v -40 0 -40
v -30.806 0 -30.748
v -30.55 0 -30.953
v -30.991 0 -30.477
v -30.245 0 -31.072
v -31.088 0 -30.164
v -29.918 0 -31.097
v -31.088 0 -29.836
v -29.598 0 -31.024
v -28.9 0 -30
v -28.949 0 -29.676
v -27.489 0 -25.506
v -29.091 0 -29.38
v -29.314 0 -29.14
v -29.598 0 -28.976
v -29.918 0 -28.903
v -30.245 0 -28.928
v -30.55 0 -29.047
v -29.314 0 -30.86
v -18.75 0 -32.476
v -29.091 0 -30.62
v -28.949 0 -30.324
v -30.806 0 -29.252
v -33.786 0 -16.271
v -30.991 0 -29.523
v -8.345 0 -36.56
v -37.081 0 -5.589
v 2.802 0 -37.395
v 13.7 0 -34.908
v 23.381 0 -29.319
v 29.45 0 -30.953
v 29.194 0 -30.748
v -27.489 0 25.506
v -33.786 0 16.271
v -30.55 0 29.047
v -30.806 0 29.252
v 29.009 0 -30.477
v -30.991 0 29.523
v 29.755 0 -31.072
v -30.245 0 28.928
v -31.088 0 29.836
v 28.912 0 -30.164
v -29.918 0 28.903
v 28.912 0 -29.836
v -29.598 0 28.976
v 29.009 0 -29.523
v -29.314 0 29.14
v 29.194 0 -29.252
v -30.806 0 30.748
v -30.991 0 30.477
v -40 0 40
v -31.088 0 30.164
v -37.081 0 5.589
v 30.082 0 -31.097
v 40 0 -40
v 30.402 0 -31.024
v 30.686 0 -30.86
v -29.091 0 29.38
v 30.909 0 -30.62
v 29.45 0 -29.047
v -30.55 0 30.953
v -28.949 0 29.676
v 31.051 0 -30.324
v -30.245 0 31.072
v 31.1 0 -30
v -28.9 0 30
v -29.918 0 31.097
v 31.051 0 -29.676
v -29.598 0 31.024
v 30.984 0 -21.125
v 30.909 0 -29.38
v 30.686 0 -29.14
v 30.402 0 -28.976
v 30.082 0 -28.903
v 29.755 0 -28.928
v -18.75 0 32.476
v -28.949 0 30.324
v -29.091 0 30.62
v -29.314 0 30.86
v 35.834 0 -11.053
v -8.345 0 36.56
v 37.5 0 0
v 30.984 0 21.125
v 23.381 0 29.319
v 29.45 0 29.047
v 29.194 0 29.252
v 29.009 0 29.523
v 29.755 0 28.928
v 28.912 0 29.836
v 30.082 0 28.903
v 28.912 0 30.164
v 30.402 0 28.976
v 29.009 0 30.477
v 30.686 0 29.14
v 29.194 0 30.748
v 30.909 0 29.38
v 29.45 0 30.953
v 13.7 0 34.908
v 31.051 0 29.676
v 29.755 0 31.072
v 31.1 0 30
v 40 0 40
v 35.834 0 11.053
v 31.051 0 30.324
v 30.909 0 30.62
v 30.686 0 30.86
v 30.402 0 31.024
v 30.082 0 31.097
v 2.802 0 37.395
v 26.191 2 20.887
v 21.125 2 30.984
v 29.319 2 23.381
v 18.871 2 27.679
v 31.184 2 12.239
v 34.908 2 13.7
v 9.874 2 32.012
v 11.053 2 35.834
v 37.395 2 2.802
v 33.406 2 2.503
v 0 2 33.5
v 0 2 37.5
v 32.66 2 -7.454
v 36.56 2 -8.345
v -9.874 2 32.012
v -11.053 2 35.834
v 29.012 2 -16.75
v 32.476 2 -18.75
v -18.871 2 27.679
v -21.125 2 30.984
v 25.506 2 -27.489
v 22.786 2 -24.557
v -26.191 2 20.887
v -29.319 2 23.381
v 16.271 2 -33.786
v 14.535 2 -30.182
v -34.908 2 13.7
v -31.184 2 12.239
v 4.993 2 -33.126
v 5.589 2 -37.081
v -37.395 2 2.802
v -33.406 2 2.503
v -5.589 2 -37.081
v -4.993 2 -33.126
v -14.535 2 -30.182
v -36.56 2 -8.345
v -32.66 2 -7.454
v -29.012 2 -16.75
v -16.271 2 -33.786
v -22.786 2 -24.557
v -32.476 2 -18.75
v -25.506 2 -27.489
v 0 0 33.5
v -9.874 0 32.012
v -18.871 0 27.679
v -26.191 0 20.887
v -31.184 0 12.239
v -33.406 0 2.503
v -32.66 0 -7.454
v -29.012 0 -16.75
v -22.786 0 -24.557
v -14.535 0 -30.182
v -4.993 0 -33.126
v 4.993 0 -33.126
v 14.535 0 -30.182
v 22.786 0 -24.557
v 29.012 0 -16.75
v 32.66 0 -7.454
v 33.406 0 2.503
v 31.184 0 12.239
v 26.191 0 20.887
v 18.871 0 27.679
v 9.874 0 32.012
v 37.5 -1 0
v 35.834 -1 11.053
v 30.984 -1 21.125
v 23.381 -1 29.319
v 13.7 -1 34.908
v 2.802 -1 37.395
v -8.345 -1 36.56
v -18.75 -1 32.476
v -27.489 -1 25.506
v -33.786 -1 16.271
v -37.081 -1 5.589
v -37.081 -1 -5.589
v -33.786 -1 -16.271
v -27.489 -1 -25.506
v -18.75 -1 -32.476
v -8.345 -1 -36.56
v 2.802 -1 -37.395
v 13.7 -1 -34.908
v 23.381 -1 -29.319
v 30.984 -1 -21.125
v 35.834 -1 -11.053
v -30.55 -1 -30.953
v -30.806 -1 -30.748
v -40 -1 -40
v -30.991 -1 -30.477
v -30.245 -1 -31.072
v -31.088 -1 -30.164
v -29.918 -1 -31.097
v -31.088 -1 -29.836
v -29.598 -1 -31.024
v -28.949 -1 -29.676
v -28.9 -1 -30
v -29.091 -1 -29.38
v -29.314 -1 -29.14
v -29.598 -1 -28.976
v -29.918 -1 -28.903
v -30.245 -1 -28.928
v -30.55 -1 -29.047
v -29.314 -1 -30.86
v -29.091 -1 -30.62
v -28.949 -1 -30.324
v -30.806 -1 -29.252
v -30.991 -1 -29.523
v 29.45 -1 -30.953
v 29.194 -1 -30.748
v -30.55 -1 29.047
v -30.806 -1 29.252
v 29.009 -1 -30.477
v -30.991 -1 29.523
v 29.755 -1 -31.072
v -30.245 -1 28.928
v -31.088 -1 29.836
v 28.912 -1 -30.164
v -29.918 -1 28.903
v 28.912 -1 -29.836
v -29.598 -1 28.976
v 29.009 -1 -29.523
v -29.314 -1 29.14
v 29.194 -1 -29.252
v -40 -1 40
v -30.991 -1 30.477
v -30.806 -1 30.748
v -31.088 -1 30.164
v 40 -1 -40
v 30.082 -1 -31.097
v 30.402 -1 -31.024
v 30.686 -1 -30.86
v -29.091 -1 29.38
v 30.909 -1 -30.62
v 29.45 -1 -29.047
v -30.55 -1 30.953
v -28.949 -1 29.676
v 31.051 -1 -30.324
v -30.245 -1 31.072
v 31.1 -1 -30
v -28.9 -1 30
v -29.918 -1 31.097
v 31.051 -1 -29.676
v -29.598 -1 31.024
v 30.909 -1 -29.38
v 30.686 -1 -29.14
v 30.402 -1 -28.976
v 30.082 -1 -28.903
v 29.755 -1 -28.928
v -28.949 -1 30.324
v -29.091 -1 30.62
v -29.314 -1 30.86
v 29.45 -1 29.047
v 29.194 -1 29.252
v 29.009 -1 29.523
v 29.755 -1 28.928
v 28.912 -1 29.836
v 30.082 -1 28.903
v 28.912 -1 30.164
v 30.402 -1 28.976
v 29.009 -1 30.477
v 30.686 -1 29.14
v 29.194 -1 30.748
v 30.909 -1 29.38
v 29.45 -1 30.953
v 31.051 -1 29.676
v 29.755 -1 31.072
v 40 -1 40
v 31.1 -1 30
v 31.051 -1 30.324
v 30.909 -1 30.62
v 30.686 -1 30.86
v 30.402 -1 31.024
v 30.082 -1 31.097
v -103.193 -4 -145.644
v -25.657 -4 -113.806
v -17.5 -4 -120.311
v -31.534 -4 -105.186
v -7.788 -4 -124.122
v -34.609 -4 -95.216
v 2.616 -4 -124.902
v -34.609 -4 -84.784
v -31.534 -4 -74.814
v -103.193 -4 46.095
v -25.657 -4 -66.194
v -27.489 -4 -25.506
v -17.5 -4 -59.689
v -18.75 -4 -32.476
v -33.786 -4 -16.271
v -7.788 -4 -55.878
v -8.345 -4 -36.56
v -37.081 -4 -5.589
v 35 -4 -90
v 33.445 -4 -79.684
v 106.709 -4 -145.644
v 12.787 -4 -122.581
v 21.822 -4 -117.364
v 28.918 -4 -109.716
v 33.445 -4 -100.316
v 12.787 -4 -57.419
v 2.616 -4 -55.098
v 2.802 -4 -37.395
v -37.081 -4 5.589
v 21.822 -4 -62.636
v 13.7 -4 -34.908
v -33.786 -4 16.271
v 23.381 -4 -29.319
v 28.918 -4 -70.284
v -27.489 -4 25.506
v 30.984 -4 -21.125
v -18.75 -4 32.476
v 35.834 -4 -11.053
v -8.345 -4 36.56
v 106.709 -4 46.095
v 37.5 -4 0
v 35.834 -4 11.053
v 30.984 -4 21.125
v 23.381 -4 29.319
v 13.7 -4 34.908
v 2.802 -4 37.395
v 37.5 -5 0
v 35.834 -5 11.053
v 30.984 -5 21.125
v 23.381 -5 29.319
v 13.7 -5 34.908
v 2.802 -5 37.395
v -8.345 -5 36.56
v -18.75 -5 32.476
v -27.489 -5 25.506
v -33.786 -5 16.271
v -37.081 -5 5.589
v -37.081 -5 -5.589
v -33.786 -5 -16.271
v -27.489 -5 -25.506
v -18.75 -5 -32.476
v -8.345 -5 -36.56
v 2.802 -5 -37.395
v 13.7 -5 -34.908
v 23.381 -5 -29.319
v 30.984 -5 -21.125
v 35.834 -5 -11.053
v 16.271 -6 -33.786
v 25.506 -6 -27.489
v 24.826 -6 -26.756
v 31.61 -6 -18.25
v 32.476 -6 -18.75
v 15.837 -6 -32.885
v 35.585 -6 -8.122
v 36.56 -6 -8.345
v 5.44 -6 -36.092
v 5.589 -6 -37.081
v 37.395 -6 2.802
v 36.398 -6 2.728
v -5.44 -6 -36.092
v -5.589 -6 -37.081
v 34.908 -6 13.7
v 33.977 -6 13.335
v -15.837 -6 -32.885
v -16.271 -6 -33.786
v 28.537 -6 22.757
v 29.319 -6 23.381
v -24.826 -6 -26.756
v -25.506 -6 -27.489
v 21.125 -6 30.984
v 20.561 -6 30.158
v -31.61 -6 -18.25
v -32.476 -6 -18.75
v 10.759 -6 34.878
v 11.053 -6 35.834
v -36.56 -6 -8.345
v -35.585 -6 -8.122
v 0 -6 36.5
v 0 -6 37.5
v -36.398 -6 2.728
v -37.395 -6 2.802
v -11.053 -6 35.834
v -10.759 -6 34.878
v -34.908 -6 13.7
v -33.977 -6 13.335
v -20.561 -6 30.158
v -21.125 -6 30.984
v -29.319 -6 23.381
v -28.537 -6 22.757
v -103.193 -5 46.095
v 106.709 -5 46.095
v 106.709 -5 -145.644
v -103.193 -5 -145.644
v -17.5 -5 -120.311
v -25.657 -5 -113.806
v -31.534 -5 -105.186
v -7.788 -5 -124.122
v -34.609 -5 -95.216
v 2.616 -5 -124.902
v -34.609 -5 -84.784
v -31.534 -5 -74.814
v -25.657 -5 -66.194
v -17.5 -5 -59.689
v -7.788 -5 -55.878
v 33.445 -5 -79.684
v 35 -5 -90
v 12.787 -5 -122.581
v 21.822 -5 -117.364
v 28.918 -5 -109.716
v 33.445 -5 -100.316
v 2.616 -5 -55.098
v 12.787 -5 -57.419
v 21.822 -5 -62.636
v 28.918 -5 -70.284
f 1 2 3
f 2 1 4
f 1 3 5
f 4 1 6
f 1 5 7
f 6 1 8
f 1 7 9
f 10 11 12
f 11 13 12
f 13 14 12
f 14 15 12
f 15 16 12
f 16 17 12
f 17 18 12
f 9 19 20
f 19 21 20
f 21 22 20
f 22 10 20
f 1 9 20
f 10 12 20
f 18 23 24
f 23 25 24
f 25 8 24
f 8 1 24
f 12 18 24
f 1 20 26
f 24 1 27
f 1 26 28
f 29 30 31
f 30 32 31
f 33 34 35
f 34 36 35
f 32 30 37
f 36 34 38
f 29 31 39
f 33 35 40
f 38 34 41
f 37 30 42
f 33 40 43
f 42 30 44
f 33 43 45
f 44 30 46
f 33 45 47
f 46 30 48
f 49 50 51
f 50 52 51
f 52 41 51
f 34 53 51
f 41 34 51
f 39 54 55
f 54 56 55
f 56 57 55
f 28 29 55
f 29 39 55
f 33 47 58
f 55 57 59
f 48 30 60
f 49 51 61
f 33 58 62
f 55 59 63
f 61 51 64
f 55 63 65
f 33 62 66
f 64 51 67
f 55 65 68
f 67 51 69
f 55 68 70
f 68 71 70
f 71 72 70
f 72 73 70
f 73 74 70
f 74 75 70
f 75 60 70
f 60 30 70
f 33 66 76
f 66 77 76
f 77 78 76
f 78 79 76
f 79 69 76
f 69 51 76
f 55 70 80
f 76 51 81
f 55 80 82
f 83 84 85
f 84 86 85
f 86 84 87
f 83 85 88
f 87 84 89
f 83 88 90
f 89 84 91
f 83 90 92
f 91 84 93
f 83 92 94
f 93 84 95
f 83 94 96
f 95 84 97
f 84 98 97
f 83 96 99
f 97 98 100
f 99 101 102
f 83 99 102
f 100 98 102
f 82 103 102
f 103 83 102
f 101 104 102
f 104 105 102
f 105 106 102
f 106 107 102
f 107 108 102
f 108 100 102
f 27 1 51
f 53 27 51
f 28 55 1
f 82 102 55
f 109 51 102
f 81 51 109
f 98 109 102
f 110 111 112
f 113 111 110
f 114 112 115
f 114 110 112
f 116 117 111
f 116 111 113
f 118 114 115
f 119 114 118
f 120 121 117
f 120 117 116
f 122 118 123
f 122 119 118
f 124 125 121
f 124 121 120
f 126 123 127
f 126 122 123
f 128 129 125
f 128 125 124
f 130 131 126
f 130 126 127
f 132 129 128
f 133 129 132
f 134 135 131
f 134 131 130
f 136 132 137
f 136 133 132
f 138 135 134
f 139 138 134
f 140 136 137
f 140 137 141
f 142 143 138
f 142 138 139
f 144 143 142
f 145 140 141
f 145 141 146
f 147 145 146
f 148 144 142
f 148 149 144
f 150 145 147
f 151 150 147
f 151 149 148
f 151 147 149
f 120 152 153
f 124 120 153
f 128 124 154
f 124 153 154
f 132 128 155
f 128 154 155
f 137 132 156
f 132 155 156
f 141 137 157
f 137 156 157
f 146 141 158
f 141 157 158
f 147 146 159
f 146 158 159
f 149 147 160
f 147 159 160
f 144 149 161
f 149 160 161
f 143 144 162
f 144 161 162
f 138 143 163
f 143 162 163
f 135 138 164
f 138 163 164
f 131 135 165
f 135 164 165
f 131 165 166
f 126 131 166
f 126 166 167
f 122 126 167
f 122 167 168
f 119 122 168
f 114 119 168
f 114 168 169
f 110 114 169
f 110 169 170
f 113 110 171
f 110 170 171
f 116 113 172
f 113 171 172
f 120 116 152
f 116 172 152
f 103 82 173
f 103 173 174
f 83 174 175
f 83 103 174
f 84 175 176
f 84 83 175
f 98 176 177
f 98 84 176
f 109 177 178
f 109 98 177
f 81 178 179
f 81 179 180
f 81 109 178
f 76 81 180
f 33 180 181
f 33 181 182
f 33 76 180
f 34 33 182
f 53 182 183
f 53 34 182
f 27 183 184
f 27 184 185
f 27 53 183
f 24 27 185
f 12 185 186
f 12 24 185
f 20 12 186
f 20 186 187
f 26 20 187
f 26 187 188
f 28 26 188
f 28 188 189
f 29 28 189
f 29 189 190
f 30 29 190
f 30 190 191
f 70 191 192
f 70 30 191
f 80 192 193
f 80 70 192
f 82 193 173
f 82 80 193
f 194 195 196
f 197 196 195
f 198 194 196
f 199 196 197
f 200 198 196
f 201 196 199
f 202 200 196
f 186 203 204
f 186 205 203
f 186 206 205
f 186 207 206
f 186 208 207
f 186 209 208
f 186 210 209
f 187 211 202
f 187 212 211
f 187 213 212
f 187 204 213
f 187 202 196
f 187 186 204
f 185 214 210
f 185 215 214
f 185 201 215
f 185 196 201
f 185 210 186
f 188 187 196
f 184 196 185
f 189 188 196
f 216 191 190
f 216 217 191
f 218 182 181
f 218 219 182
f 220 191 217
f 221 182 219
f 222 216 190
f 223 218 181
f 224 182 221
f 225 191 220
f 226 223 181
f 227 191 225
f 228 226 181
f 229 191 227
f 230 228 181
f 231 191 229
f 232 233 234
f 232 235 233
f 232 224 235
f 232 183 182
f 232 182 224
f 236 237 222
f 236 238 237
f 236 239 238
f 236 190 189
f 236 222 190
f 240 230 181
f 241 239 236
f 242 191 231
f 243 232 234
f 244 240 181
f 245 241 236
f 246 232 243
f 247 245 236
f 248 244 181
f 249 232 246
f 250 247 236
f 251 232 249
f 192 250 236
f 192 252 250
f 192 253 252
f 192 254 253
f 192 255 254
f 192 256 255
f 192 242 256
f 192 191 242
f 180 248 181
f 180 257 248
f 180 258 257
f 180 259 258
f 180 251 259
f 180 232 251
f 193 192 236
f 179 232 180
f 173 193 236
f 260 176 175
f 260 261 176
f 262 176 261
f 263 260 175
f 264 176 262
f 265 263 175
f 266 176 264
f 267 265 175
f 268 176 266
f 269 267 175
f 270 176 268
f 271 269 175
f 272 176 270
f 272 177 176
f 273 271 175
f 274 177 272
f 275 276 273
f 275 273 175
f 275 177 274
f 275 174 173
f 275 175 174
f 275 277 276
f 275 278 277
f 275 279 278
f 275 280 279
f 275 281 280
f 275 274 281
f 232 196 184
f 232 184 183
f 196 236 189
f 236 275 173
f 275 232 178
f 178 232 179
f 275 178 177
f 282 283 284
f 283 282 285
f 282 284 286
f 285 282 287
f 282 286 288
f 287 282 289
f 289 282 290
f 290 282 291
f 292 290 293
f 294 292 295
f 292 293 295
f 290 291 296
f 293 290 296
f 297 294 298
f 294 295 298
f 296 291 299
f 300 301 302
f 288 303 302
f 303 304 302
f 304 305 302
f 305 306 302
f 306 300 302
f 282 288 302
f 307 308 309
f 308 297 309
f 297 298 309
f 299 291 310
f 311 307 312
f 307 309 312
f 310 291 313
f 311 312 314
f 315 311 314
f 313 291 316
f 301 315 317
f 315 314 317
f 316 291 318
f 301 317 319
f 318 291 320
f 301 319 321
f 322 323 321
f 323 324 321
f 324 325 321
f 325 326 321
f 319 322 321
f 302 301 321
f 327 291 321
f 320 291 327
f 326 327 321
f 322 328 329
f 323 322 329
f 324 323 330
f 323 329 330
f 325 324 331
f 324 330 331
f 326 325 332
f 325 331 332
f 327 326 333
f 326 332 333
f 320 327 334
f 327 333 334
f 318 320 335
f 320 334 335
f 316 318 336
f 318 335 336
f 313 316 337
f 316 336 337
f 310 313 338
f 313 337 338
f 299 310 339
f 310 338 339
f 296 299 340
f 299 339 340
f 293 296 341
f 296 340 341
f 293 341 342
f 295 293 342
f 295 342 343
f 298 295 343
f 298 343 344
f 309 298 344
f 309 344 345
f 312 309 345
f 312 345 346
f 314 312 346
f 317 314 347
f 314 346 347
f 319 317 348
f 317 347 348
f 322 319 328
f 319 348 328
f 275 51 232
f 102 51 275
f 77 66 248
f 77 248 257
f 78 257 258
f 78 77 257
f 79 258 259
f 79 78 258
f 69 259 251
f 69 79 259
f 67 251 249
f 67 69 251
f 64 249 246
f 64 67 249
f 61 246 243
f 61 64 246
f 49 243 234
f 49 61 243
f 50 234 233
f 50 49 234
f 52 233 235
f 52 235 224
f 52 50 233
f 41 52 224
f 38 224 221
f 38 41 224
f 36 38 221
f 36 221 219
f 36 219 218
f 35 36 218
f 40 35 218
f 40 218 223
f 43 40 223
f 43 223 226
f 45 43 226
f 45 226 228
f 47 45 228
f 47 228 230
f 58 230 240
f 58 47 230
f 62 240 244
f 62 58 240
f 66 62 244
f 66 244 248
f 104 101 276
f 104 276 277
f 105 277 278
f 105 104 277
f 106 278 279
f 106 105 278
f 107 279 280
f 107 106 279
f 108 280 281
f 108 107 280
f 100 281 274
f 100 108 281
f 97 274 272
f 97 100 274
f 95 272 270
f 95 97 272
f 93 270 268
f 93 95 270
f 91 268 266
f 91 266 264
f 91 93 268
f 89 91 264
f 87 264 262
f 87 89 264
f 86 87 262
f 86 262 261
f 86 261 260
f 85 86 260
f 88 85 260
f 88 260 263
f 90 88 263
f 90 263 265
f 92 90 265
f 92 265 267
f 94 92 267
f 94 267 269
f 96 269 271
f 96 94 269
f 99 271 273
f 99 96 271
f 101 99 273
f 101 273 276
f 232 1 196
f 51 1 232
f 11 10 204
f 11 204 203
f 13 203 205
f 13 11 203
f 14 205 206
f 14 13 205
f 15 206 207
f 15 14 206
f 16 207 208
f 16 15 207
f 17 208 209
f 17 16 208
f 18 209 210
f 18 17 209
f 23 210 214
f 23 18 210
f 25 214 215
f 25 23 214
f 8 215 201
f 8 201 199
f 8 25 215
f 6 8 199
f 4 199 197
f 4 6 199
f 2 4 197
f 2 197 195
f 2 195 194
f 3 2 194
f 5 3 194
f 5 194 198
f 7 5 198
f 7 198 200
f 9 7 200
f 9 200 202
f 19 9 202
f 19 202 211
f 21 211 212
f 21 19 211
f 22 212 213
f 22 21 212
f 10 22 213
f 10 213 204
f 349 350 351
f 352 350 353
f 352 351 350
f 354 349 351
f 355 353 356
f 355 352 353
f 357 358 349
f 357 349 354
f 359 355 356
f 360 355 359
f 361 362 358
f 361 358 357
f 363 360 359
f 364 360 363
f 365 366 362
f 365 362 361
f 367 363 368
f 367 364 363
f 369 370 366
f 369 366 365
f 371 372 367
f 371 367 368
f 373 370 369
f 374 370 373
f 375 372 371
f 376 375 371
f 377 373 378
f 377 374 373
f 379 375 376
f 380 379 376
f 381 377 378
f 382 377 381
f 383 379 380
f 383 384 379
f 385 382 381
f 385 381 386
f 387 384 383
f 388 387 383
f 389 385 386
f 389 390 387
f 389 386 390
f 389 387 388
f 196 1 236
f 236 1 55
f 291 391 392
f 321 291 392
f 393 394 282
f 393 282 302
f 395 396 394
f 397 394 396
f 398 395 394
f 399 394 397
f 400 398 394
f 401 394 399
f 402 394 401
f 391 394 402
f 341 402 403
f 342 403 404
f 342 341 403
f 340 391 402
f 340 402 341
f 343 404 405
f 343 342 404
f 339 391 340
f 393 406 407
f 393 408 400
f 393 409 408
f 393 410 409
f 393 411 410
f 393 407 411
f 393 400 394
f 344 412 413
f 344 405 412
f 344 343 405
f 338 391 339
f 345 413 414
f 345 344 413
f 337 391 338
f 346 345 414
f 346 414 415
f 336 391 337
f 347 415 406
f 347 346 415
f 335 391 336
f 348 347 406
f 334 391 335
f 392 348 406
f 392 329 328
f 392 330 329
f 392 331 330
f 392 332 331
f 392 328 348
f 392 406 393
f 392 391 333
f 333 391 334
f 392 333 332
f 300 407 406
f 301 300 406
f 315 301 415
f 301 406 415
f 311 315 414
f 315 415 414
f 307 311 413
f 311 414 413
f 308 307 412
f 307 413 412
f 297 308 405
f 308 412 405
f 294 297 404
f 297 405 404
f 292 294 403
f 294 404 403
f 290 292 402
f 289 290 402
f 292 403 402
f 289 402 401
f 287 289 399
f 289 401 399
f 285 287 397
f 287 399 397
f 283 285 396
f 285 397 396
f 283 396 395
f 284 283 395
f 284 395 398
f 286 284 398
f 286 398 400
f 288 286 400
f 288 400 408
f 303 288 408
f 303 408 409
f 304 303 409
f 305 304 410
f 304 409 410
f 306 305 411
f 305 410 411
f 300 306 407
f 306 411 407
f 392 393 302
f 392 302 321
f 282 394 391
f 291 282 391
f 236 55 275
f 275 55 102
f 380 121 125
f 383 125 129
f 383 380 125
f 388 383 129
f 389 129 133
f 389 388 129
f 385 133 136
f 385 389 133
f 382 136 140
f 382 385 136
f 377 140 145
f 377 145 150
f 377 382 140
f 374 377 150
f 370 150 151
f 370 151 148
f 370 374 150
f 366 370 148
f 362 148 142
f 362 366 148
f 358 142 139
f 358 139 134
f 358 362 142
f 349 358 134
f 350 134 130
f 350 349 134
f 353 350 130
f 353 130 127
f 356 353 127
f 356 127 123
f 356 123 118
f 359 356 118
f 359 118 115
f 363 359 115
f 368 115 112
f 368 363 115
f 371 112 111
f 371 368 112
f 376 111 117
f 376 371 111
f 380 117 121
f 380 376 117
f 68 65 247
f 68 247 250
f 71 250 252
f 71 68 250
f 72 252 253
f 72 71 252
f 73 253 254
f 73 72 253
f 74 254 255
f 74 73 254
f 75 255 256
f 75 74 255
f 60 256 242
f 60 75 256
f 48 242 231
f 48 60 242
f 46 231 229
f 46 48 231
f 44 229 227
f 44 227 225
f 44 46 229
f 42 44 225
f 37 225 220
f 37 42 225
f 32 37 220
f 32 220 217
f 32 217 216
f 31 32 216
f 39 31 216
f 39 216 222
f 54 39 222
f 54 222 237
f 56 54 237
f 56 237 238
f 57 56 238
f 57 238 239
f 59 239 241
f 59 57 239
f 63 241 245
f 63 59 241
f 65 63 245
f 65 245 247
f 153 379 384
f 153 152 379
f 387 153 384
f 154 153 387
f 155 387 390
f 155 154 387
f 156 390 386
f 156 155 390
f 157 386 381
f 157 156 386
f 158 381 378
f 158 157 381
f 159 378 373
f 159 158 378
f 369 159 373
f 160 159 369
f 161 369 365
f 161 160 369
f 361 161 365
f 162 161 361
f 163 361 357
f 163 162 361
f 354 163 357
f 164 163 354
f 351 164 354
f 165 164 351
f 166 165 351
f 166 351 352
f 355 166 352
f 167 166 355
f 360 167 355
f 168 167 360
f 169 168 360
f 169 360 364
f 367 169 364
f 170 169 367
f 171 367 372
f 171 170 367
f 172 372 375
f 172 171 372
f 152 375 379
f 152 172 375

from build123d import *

# Parameters (mm, degrees)
F1_W     = 209.9018618464
F1_H     = 191.7395107448
F1_R     = 35
F1_R_2   = 37.5
F2_DEPTH = 1
F5_W     = 80
F5_H     = 80
F5_R     = 1.1
F5_R_2   = 37.5
F6_DEPTH = 1
F7_DEPTH = 2


with BuildPart() as f2:
    # F1 (on offset) → F2 (new body)
    with BuildSketch(Plane.XZ.offset(5)):
        with Locations((1.7582438886, -49.7746858746)):
            Rectangle(F1_W, F1_H)
        with Locations((0, -90)):
            Circle(F1_R, mode=Mode.SUBTRACT)
        Circle(F1_R_2, mode=Mode.SUBTRACT)
    extrude(amount=-F2_DEPTH)


with BuildPart() as f4:
    # F3 (on Right) → F4 (revolve)
    with BuildSketch(Plane.YZ):
        Polygon((0, 37.5), (-6, 37.5), (-6, 36.5), (0, 33.5), align=None)
    revolve(axis=Axis((0, 1.602868408, 0), (0, -1, 0)))

    # F7 (add): a face of the model
    f7_faces = [f4.faces().sort_by_distance(p)[0] for p in [
        (0, 0, -34.5606601718),
    ]]
    extrude(f7_faces, amount=F7_DEPTH)


with BuildPart() as f6:
    # F5 (on Front) → F6 (new body)
    with BuildSketch(Plane.XZ):
        Rectangle(F5_W, F5_H)
        with Locations((-30, -30)):
            Circle(F5_R, mode=Mode.SUBTRACT)
        with Locations((30, -30)):
            Circle(F5_R, mode=Mode.SUBTRACT)
        with Locations((-30, 30)):
            Circle(F5_R, mode=Mode.SUBTRACT)
        Circle(F5_R_2, mode=Mode.SUBTRACT)
        with Locations((30, 30)):
            Circle(F5_R, mode=Mode.SUBTRACT)
    extrude(amount=F6_DEPTH)


solid = Compound([f2.part, f4.part, f6.part])
